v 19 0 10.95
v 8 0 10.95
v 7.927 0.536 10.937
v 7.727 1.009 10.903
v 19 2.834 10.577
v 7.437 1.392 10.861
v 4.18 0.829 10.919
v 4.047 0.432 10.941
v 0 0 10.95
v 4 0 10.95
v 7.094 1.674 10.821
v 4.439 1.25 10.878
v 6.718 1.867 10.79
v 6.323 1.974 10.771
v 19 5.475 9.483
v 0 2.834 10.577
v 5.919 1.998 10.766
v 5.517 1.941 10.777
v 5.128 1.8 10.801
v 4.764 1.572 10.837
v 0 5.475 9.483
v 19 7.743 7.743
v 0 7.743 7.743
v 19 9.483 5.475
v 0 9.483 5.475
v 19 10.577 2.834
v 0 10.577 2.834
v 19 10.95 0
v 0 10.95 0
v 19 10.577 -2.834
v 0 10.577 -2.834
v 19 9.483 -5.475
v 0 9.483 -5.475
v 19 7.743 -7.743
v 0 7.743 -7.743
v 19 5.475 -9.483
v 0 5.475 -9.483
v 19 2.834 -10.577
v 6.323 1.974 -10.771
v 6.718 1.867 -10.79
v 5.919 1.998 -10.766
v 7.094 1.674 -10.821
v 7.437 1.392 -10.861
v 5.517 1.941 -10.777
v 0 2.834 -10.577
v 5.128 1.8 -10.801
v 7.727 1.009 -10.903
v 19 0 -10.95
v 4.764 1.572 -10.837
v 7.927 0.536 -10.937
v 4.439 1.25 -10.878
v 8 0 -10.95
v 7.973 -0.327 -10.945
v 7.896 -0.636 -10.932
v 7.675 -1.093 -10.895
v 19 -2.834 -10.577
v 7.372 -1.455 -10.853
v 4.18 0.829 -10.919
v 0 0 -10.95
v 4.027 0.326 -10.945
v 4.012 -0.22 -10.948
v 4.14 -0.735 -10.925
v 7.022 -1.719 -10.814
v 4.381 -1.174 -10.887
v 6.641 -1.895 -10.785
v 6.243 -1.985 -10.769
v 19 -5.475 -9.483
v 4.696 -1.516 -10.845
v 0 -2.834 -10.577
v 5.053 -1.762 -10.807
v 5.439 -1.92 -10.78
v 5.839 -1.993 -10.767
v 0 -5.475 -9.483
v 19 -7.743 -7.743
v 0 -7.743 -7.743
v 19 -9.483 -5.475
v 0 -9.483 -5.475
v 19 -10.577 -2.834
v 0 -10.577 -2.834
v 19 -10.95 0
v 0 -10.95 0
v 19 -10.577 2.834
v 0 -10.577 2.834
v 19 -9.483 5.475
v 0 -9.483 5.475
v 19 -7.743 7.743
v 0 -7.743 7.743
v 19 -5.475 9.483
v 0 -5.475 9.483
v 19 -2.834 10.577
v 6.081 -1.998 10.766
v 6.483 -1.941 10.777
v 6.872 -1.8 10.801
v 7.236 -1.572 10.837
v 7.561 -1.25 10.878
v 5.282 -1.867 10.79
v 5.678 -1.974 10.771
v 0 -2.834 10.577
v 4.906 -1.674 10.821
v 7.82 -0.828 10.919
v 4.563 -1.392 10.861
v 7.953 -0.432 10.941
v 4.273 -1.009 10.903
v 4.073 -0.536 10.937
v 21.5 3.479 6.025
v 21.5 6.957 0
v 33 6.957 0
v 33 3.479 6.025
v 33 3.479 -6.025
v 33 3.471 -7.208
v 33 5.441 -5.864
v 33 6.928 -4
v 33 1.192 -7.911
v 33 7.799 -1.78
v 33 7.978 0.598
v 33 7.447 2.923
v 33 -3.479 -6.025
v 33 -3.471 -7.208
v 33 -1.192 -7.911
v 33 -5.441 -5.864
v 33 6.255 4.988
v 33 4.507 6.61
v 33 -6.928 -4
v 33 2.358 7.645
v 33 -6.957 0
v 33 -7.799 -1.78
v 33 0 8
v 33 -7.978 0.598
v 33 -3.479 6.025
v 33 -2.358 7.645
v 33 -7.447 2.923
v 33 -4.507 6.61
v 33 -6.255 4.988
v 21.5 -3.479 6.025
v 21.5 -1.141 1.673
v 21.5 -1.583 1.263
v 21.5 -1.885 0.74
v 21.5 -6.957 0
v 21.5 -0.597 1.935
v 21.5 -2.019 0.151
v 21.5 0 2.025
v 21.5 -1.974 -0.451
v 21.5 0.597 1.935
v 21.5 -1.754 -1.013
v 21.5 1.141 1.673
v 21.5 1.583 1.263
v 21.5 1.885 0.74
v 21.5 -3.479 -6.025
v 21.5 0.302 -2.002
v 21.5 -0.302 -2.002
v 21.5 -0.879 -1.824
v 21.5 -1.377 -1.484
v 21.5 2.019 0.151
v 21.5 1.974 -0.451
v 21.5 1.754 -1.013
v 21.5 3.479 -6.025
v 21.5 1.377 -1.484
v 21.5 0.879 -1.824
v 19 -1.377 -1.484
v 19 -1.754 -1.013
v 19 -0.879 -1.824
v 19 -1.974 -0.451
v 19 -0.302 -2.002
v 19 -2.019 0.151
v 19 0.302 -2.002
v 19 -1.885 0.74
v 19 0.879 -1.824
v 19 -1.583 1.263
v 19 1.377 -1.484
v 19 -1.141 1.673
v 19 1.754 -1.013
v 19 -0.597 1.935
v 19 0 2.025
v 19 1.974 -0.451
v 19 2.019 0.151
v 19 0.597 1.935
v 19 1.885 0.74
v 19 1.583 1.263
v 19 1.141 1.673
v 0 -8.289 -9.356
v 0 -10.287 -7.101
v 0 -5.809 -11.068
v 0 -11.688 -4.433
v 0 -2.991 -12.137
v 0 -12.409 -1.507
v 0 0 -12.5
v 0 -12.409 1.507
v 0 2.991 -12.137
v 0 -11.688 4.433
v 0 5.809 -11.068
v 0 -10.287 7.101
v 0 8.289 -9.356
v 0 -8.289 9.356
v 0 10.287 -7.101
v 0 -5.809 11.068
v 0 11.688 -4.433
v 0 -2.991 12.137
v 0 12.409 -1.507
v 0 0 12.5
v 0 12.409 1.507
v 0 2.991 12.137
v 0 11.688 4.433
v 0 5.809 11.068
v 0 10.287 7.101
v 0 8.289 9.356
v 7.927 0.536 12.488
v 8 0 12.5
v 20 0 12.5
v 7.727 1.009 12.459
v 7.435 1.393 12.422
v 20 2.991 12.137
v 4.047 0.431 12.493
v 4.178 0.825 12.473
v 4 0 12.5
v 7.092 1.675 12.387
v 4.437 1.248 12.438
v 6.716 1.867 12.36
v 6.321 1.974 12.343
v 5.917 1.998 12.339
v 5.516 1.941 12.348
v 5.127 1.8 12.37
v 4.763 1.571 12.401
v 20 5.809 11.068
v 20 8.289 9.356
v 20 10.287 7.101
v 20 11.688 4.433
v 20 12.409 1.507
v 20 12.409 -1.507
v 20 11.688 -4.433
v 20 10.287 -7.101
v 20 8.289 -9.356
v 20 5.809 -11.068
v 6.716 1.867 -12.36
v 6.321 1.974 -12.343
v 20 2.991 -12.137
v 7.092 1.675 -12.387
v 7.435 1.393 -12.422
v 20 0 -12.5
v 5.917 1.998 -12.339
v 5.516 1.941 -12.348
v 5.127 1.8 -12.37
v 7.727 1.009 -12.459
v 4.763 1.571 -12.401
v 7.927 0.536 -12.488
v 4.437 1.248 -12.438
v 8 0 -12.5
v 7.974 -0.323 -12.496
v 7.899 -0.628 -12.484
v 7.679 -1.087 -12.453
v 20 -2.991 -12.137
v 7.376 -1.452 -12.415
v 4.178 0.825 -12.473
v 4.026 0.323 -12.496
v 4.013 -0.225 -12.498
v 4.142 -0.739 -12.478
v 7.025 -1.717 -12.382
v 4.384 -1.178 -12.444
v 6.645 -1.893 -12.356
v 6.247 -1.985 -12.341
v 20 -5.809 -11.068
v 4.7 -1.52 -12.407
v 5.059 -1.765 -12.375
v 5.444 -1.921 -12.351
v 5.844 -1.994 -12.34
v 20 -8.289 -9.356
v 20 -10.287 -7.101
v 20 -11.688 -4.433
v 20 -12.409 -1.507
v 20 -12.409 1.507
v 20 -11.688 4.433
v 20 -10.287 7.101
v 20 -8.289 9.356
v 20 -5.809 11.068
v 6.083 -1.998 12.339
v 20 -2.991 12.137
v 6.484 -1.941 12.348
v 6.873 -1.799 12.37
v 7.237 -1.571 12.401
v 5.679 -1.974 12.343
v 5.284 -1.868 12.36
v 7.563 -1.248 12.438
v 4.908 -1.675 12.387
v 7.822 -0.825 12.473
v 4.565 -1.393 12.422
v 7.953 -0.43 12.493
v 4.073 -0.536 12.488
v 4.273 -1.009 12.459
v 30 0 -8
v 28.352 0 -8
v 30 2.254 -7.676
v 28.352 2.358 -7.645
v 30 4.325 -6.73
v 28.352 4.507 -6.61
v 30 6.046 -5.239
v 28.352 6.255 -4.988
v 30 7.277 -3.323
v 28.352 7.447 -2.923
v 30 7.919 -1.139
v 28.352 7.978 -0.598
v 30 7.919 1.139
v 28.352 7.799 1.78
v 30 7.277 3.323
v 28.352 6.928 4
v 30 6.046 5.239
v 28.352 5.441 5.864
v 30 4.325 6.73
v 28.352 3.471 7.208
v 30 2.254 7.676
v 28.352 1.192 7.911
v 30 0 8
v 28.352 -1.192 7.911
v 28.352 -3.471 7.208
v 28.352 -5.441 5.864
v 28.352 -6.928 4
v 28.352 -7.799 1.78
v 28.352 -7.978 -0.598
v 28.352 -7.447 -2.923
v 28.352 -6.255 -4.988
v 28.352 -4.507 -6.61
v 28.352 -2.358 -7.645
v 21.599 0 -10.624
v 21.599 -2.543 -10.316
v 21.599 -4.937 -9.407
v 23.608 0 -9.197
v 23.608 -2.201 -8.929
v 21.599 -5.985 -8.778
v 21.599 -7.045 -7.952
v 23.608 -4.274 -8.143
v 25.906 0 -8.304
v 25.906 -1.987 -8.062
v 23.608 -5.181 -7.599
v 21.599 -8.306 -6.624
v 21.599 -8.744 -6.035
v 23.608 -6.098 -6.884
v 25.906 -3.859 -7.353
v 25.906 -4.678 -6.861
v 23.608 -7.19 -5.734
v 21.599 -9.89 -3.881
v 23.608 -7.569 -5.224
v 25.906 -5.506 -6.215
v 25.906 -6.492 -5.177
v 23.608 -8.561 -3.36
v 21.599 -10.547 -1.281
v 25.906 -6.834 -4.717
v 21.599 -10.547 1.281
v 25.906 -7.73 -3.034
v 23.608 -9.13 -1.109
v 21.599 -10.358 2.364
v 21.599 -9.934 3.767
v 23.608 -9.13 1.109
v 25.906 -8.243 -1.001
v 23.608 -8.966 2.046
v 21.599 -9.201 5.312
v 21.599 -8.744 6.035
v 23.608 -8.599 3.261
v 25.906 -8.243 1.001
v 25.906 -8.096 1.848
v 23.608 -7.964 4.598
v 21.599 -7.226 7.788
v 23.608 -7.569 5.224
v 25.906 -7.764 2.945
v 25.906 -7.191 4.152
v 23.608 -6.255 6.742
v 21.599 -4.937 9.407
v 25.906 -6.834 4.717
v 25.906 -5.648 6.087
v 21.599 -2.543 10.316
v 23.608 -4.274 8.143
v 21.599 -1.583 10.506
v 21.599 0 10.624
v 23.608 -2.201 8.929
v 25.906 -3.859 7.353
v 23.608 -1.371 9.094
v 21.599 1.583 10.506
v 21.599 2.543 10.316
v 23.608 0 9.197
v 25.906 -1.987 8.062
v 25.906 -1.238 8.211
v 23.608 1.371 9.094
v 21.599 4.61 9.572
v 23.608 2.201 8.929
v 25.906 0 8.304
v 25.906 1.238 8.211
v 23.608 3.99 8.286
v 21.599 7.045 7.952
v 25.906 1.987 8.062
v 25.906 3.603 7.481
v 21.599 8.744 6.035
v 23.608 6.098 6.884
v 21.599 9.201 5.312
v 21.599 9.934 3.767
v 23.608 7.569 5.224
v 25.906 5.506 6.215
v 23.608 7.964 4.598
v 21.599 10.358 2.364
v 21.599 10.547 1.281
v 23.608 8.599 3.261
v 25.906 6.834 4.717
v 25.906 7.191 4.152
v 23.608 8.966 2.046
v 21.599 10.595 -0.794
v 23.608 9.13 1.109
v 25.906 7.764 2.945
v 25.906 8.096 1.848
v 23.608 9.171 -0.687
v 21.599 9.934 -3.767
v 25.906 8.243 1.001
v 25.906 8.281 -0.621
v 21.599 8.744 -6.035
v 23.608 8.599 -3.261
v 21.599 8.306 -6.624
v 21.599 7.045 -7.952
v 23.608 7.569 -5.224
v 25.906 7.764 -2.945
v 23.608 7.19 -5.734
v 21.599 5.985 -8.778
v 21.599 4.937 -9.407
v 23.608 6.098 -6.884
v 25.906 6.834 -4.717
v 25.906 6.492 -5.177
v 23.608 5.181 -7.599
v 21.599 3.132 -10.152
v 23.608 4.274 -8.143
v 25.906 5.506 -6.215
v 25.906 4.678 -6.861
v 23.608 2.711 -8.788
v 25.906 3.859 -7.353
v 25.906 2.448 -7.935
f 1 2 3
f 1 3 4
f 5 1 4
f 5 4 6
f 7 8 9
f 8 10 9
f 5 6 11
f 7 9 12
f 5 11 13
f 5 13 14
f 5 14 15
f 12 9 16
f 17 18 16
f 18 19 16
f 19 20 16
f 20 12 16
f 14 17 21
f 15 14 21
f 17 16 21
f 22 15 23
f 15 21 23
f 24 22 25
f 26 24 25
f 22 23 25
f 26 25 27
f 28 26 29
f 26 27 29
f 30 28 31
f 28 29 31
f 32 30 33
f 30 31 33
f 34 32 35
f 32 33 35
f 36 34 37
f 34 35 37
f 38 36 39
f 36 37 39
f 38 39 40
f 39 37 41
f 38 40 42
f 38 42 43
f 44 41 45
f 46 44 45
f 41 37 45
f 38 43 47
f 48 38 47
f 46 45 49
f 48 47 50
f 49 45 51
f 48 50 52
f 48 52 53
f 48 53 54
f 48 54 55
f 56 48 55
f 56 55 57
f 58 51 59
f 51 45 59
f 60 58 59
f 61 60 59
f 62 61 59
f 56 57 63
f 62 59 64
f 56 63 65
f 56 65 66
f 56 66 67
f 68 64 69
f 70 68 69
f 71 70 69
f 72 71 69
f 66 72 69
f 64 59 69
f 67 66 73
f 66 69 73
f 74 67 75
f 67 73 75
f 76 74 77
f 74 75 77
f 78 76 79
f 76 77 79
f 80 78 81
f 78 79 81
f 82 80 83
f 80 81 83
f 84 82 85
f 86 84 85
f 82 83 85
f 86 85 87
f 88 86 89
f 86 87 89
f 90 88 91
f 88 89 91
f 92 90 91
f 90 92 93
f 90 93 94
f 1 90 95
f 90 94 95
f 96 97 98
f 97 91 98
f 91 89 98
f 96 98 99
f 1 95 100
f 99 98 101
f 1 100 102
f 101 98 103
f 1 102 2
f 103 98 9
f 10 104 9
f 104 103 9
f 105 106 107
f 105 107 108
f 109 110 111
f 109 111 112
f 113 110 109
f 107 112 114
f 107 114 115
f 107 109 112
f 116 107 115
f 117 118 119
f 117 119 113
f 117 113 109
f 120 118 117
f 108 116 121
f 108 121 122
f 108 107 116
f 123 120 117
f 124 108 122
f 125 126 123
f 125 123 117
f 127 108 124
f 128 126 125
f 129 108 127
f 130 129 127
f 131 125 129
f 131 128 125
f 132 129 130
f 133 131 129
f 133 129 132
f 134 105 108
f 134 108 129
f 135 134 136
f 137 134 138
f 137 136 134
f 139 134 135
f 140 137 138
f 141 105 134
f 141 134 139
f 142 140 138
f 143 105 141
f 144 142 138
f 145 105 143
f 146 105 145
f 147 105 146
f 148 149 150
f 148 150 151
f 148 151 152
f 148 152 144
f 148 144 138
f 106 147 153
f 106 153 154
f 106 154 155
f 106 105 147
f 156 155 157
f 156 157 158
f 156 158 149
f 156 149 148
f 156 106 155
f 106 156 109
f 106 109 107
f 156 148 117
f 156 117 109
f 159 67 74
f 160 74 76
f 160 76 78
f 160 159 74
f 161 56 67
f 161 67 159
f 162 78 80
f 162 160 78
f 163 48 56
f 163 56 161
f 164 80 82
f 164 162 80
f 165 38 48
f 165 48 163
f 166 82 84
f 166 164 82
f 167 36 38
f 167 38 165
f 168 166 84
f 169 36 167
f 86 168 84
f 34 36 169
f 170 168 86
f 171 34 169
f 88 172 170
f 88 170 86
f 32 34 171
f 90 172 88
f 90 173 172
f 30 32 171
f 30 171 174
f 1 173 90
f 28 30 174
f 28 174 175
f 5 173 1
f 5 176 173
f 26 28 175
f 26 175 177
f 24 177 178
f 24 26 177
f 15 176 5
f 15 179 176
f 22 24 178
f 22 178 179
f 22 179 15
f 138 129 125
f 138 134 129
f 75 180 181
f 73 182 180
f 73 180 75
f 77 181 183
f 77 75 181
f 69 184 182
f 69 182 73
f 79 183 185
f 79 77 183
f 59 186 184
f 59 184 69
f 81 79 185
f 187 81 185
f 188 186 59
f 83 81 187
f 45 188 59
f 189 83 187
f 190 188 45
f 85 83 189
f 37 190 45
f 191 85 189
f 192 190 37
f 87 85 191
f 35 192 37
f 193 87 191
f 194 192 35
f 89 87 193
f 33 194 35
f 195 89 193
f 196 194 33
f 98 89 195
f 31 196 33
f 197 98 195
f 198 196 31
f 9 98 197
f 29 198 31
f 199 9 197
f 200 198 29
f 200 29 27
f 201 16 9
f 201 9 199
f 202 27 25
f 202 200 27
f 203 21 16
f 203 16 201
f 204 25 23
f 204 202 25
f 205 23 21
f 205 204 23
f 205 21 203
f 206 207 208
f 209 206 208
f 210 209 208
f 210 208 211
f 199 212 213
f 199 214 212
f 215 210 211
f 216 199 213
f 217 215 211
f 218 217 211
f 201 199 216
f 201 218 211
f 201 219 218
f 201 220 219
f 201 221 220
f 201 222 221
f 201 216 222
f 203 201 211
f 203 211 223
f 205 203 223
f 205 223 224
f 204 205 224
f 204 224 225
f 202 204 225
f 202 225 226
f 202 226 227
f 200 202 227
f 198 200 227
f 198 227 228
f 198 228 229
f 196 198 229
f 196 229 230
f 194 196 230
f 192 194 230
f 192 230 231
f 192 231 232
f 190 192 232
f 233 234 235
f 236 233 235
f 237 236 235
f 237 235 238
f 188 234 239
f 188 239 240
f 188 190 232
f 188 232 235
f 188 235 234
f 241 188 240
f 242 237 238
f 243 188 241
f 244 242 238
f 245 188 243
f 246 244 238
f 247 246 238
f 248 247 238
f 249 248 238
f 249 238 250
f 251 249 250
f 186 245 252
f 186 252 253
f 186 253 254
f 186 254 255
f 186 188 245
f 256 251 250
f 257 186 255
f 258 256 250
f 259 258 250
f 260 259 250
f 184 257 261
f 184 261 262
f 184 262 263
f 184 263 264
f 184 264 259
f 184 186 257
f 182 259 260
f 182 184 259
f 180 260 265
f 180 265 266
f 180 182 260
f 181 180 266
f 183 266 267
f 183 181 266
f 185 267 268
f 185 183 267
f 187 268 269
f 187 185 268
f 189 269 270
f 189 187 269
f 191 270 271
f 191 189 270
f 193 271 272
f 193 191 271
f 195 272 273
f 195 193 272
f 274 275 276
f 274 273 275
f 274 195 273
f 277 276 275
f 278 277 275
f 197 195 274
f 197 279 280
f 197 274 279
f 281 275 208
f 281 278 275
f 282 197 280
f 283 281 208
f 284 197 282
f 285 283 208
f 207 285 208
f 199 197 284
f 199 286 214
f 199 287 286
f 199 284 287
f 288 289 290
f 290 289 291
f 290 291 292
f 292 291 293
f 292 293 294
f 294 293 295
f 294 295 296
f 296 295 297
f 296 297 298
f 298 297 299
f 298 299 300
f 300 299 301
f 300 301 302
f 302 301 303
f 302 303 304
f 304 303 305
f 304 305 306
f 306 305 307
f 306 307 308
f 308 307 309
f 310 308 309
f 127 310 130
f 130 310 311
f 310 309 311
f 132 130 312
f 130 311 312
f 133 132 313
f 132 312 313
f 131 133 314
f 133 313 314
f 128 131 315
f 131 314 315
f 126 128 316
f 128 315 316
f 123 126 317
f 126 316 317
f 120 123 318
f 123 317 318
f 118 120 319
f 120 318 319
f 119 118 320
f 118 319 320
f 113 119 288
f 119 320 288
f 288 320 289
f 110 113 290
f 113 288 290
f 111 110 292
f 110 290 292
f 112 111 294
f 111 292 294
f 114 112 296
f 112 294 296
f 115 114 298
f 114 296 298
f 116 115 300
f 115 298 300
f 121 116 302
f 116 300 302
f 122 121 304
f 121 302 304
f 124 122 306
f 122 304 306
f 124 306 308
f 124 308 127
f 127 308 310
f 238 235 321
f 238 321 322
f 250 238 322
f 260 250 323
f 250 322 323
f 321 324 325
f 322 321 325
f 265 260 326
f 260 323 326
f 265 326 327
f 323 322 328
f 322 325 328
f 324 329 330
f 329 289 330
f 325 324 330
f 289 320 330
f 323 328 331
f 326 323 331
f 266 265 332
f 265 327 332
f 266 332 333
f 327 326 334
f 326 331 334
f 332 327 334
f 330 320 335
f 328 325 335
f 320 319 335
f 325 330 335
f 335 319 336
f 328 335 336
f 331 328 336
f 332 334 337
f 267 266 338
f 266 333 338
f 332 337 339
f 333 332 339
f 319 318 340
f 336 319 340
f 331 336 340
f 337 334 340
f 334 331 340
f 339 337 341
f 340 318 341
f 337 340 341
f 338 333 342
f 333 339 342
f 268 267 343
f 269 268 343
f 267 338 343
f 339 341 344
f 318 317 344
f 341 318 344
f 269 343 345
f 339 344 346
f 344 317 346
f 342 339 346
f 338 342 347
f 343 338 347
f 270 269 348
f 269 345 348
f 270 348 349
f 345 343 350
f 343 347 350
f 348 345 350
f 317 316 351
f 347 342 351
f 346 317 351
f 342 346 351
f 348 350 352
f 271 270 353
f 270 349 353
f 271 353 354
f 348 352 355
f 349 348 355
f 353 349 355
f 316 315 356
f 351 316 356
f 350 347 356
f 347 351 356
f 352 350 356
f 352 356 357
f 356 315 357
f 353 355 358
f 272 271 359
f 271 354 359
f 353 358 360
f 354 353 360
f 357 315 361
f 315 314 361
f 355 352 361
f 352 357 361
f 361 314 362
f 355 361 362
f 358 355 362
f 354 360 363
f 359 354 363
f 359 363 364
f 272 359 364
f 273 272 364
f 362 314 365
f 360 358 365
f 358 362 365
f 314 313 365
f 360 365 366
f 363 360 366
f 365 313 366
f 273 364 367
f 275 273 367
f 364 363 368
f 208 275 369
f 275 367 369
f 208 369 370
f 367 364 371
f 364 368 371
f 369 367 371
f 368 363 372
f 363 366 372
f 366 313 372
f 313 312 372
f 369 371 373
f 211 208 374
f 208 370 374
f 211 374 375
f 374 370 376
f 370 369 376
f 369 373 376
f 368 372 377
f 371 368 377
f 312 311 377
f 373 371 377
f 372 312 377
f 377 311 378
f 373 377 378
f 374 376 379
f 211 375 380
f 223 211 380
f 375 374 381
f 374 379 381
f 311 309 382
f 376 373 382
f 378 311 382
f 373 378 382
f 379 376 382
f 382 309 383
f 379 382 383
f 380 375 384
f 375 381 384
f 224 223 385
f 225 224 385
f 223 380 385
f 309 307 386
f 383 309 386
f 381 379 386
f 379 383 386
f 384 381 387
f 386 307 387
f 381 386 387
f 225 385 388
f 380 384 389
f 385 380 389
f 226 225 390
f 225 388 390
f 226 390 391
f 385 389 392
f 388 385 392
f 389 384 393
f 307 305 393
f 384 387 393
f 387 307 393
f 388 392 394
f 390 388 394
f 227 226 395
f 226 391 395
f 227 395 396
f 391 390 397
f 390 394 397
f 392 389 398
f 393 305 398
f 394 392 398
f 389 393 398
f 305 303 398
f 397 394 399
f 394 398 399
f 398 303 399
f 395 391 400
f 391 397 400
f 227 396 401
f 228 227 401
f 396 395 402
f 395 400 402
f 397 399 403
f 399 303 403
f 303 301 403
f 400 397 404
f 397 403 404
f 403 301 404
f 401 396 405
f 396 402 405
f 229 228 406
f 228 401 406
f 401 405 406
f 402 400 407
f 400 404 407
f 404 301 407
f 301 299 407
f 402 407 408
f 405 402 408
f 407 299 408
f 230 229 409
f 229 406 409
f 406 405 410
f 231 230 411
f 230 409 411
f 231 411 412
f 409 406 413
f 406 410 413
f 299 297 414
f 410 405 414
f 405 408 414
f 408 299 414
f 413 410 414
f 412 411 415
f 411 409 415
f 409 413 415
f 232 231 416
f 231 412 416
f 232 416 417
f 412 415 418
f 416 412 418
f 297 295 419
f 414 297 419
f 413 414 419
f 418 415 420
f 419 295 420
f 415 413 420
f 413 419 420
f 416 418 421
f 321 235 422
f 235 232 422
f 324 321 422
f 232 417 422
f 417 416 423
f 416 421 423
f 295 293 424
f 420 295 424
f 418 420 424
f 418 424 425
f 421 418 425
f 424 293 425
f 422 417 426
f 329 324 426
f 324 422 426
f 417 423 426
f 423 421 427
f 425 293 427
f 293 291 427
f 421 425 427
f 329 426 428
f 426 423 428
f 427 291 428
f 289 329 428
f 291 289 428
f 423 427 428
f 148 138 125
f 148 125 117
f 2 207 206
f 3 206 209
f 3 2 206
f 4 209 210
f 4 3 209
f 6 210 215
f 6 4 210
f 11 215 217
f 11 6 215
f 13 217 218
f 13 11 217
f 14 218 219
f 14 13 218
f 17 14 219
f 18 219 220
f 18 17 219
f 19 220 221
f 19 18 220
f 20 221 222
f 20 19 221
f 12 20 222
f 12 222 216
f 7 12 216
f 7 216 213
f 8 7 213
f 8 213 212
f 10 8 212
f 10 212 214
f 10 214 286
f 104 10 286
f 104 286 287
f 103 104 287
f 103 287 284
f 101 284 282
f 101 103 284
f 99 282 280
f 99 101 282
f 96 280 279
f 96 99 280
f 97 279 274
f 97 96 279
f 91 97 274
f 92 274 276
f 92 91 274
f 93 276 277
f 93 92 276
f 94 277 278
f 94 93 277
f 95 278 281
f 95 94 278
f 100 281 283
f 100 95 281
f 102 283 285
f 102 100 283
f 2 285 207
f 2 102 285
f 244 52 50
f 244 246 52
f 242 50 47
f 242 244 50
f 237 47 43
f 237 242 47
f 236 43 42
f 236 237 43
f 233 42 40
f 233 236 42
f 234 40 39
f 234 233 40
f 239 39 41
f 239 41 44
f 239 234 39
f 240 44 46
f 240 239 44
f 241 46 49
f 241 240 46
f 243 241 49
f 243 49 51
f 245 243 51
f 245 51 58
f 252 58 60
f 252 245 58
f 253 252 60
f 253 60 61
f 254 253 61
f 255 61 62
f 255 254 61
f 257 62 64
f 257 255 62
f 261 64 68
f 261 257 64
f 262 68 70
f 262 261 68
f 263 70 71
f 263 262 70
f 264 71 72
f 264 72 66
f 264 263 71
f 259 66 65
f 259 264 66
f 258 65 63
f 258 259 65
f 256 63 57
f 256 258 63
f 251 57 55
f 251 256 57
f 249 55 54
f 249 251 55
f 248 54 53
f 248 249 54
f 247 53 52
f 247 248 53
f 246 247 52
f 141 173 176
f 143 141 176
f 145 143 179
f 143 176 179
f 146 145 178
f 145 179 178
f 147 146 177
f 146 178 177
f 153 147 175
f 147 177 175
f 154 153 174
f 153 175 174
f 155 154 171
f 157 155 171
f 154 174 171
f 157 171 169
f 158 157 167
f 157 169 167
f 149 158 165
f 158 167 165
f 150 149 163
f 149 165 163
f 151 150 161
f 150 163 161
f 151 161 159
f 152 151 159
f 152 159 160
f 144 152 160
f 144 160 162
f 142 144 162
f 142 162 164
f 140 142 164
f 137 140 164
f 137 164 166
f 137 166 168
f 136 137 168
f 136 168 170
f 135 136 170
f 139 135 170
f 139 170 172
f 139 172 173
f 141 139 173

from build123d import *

# Parameters (mm, degrees)
CROQUIS1_R                 = 8
SALIENTE_EXTRUIR1_DEPTH    = 30
CORTAR_EXTRUIR1_DEPTH      = 8.5
CROQUIS9_R                 = 12.5
SALIENTE_EXTRUIR5_DEPTH    = 20
CROQUIS3_R                 = 10.95
CORTAR_EXTRUIR2_DEPTH      = 19
CORTAR_EXTRUIR3_REACH      = 27.952
CROQUIS4_R                 = 2.025
CORTAR_EXTRUIR4_DEPTH      = 35.820970693
CORTAR_EXTRUIR4_DEPTH_BACK = 35.820970693
CROQUIS5_R                 = 2
CROQUIS7_R                 = 8
SALIENTE_EXTRUIR3_DEPTH    = 3
REDONDEO1_R                = 10


with BuildPart() as part:
    # Croquis1 → Saliente-Extruir1 (new body)
    with BuildSketch(Plane(origin=(0, 0, 0), x_dir=(0, 0, -1), z_dir=(1, 0, 0))):
        Circle(CROQUIS1_R)
    extrude(amount=SALIENTE_EXTRUIR1_DEPTH)

    # Croquis2 → Cortar-Extruir1 (cut)
    with BuildSketch(Plane(origin=(30, 0, 0), x_dir=(0, 0, -1), z_dir=(1, 0, 0))):
        Polygon((0, -6.957070744), (6.025, -3.478535372), (6.025, 3.478535372), (0, 6.957070744), (-6.025, 3.478535372), (-6.025, -3.478535372), align=None)
    extrude(amount=-CORTAR_EXTRUIR1_DEPTH, mode=Mode.SUBTRACT)

    # Croquis9 → Saliente-Extruir5 (add)
    with BuildSketch(Plane.ZY):
        Circle(CROQUIS9_R)
    extrude(amount=-SALIENTE_EXTRUIR5_DEPTH)

    # Croquis3 → Cortar-Extruir2 (cut)
    with BuildSketch(Plane.ZY):
        Circle(CROQUIS3_R)
    extrude(amount=-CORTAR_EXTRUIR2_DEPTH, mode=Mode.SUBTRACT)

    # Croquis4 → Cortar-Extruir3 (cut, up to next)
    with BuildSketch(Plane.ZY.offset(-19), mode=Mode.PRIVATE) as cortar_extruir3_sk1:
        Circle(CROQUIS4_R)
    cortar_extruir3_tool1 = extrude(cortar_extruir3_sk1.sketch, amount=-CORTAR_EXTRUIR3_REACH, mode=Mode.PRIVATE) & part.part
    add(cortar_extruir3_tool1.solids().sort_by_distance((19, 0, 0))[0], mode=Mode.SUBTRACT)

    # Croquis5 → Cortar-Extruir4 (cut, two sides: drawn at the far end of the back side and taken through both)
    with BuildSketch(Plane.XY.offset(-CORTAR_EXTRUIR4_DEPTH_BACK)):
        with Locations((6, 0)):
            Circle(CROQUIS5_R)
    extrude(amount=CORTAR_EXTRUIR4_DEPTH + CORTAR_EXTRUIR4_DEPTH_BACK, mode=Mode.SUBTRACT)

    # Croquis7 → Saliente-Extruir3 (add)
    with BuildSketch(Plane(origin=(30, 0, 0), x_dir=(0, 0, -1), z_dir=(1, 0, 0))):
        with Locations(Location((0, 0, 0), (0, 0, 180))):
            Circle(CROQUIS7_R)
        Polygon((-6.025, -3.478535372), (0, -6.957070744), (6.025, -3.478535372), (6.025, 3.478535372), (0, 6.957070744), (-6.025, 3.478535372), align=None, mode=Mode.SUBTRACT)
    extrude(amount=SALIENTE_EXTRUIR3_DEPTH)

    # Redondeo1
    # the kernel refuses this fillet: 10 mm, written as the material it adds along each edge
    with BuildSketch(Plane(origin=(20, 0, 0), x_dir=(0, 0, -1), z_dir=(0, 1, 0))) as redondeo1_piece_1:
        with BuildLine():
            CenterArc((18, -8.351646544), REDONDEO1_R, 123.367012969, 56.632987031)
            Line((12.5, 0), (12.39, 0.167032931))
            ThreePointArc((12.39, 0.167032931), (10.25, 0.2), (8, 0.2))
            Line((8, 0.2), (7.8, 0))
            Line((7.8, 0), (7.8, -8.351646544))
            Line((7.8, -8.351646544), (8, -8.351646544))
        make_face()
    revolve(axis=Axis((20, 0, 0), (-1, 0, 0)))


solid = part.part
